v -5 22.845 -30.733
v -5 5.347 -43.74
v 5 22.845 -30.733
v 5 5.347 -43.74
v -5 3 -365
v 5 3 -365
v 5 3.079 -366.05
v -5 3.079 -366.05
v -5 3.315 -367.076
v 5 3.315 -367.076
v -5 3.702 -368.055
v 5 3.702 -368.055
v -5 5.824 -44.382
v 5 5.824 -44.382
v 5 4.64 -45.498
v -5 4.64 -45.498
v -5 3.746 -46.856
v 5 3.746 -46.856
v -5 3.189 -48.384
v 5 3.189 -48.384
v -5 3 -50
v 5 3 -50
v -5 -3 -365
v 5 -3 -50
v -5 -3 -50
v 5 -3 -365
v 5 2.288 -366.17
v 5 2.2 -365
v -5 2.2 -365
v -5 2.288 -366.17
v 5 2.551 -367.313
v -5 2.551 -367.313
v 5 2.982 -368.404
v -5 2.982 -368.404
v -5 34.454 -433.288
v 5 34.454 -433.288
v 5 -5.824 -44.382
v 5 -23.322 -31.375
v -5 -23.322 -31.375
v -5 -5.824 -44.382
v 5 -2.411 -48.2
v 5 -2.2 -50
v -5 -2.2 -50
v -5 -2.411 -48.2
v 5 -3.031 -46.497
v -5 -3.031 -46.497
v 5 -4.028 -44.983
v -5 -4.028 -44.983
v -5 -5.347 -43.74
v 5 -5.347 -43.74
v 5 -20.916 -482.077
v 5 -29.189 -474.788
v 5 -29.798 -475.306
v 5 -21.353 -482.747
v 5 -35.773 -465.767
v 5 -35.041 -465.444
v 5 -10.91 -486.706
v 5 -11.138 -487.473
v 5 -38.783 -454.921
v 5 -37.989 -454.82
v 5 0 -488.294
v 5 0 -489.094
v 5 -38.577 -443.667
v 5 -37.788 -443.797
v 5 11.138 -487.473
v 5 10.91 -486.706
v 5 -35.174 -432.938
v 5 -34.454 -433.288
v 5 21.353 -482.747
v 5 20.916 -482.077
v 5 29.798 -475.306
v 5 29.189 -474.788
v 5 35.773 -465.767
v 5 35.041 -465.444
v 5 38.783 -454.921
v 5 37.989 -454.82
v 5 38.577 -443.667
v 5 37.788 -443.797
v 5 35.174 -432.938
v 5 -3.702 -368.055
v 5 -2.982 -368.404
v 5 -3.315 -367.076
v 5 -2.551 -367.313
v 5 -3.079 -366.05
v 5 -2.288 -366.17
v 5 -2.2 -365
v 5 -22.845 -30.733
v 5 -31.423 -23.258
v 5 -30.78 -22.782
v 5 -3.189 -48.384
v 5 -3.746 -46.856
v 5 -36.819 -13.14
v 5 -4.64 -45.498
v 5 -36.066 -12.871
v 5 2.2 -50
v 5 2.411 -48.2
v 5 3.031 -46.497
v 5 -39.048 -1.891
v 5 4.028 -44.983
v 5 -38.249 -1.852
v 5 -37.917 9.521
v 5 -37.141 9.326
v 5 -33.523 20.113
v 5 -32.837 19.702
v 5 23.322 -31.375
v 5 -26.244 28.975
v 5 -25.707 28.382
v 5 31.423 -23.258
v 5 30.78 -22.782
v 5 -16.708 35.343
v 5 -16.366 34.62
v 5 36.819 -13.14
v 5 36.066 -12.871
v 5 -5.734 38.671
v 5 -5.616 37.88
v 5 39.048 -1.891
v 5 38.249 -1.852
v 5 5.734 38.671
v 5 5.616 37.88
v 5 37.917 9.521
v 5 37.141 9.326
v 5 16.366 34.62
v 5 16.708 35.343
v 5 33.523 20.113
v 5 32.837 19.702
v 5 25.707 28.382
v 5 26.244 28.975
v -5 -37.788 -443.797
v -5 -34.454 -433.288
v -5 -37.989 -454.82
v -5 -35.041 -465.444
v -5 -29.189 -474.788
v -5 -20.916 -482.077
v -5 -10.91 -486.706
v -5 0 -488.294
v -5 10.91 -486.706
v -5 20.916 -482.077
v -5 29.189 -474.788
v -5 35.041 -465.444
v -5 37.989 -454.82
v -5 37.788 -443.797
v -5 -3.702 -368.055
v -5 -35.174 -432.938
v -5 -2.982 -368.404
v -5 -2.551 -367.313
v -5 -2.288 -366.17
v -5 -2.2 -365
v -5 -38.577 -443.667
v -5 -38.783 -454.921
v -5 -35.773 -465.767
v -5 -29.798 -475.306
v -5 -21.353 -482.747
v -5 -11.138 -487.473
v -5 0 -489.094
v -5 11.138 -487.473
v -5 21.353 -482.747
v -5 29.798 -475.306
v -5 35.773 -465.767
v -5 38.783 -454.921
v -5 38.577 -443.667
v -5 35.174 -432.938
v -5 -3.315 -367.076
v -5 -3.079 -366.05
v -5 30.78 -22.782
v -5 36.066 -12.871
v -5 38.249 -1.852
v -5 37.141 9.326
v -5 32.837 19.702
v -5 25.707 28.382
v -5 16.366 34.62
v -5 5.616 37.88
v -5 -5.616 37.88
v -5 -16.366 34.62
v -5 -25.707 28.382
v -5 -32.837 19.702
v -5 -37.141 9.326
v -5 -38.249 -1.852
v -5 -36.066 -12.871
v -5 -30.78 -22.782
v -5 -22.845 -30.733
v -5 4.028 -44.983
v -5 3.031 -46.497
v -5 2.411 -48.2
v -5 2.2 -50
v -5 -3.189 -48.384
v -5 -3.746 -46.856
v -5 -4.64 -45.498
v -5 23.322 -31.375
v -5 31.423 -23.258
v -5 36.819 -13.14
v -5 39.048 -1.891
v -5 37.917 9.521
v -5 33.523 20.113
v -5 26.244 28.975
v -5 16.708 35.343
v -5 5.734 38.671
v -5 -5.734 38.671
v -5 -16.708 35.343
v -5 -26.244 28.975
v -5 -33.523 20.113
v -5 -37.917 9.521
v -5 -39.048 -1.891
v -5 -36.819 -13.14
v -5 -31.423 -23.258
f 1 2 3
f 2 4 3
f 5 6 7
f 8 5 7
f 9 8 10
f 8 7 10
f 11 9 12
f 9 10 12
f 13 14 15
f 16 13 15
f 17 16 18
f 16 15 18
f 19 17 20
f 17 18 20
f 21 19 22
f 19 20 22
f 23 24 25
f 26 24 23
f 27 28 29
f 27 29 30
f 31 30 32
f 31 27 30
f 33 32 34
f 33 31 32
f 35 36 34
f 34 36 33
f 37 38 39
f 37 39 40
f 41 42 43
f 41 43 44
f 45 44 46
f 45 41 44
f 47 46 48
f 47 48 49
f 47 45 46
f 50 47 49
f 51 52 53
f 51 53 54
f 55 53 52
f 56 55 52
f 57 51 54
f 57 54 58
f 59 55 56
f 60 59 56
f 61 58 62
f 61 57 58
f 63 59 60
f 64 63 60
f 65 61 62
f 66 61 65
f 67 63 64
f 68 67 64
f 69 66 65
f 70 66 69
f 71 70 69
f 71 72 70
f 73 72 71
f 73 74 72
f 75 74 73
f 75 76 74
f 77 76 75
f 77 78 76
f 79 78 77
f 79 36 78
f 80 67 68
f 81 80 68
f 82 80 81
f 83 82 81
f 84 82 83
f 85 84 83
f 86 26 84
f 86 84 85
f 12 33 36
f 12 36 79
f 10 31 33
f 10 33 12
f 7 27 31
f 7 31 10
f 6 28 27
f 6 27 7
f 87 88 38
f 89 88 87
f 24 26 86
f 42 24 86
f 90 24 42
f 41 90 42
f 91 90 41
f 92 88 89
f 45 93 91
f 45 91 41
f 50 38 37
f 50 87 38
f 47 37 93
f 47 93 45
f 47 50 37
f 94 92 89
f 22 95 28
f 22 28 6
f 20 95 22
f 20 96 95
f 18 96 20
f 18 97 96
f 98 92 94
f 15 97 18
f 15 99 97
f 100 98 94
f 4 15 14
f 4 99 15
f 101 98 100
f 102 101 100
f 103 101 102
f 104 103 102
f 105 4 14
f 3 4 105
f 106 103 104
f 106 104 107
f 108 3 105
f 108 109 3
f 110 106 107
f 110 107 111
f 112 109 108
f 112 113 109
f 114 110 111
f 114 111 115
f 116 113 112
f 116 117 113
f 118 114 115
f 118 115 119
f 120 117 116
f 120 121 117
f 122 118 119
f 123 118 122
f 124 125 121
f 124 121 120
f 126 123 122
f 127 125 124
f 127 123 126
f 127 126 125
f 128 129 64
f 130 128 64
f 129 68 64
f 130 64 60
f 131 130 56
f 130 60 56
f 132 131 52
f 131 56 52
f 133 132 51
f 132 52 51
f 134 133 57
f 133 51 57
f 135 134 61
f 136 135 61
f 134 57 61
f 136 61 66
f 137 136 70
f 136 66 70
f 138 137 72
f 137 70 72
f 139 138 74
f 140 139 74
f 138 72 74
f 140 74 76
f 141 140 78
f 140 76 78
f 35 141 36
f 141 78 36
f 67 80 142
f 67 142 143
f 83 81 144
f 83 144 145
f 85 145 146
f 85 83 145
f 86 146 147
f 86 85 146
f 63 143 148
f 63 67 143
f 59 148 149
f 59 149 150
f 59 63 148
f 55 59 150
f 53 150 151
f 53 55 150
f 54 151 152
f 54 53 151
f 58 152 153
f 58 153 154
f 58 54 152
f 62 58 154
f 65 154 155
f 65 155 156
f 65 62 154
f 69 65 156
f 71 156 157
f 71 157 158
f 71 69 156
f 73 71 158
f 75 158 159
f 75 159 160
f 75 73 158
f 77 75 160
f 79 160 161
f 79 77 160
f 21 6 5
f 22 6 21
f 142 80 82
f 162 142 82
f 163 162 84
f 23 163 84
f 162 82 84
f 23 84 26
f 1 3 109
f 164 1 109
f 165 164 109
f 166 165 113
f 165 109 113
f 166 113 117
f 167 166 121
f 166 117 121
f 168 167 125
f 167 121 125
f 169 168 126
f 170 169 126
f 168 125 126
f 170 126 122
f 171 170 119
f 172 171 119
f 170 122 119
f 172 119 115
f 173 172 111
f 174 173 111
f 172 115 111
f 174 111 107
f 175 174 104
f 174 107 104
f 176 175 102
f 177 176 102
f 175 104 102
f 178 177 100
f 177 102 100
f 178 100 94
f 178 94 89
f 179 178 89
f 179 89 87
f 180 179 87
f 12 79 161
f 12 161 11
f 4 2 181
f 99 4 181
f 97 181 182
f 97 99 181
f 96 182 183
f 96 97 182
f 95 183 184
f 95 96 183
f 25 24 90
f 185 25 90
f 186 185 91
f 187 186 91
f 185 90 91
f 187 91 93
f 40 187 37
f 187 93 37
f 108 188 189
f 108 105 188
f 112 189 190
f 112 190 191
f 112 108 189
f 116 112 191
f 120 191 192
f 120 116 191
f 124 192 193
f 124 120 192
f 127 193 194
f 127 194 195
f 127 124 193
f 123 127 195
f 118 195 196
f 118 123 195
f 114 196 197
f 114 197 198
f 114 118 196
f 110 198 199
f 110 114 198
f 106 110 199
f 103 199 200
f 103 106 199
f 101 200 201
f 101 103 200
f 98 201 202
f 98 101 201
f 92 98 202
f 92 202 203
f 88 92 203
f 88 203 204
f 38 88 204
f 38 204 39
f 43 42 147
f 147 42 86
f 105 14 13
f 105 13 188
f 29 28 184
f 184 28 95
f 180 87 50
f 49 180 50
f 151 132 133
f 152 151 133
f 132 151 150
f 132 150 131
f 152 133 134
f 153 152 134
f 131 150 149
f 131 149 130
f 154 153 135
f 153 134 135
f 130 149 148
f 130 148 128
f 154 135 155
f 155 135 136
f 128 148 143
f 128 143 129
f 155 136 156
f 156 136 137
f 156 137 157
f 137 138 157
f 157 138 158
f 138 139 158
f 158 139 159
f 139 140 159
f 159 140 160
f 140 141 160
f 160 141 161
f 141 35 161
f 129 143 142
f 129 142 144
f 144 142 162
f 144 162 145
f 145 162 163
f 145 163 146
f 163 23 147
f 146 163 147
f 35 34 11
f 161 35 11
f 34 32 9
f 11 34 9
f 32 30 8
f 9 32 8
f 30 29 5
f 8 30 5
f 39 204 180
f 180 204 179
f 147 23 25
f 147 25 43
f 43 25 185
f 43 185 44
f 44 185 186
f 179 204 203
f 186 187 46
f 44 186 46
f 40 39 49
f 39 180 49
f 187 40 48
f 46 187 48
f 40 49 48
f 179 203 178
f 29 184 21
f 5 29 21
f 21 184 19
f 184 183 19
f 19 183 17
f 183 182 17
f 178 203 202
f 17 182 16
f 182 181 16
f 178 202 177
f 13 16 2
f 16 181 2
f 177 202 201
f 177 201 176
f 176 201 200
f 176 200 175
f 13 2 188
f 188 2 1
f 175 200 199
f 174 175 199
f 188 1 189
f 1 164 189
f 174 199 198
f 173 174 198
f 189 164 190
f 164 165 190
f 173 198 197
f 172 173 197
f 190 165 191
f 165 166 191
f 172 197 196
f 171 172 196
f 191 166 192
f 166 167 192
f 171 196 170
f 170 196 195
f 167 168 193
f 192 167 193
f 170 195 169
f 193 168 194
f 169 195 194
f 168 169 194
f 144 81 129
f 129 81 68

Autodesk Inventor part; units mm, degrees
ref_plane "YZ Plane" through (0, 0, 0) normal (1, 0, 0) x (0, 1, 0)
ref_plane "XZ Plane" through (0, 0, 0) normal (0, 1, 0) x (-1, 0, 0)
ref_plane "XY Plane" through (0, 0, 0) normal (0, 0, 1) x (1, 0, 0)
sketch "スケッチ1" plane through (0, 0, 0) normal (1, 0, 0) x (0, 1, 0)
  arc A0 (23.0723, -31.0387) -> (-23.0723, -31.0387) centre (0, 0) ccw
  arc A1 (-34.7971, -433.1214) -> (34.7971, -433.1214) centre (0, -450) ccw
  arc A2 (-2.581, -50) -> (-5.574, -44.0458) centre (-10, -50) ccw
  line L0 (-5.574, -44.0458) -> (-23.0723, -31.0387)
  line L1 (23.0723, -31.0387) -> (5.574, -44.0458)
  line L2 (34.7971, -433.1214) -> (3.3248, -368.2378)
  line L3 (-34.7971, -433.1214) -> (-3.3248, -368.2378)
  arc A3 (5.574, -44.0458) -> (2.581, -50) centre (10, -50) ccw
  arc A4 (2.581, -365) -> (3.3248, -368.2378) centre (10, -365) ccw
  arc A5 (-3.3248, -368.2378) -> (-2.581, -365) centre (-10, -365) ccw
  line L4 (-2.581, -50) -> (-2.581, -365)
  line L5 (2.581, -365) -> (2.581, -50)
  line L6 (5.824, -44.3821) -> (23.3222, -31.3749)
  arc A6 (23.3222, -31.3749) -> (-23.3222, -31.3749) centre (0, 0) ccw
  line L7 (-23.3222, -31.3749) -> (-5.824, -44.3821)
  arc A7 (-3, -50) -> (-5.824, -44.3821) centre (-10, -50) ccw
  line L8 (-3, -50) -> (-3, -365)
  arc A8 (-3.7018, -368.055) -> (-3, -365) centre (-10, -365) ccw
  line L9 (-3.7018, -368.055) -> (-35.1741, -432.9385)
  arc A9 (-35.1741, -432.9385) -> (35.1741, -432.9385) centre (0, -450) ccw
  line L10 (35.1741, -432.9385) -> (3.7018, -368.055)
  arc A10 (3, -365) -> (3.7018, -368.055) centre (10, -365) ccw
  line L11 (3, -365) -> (3, -50)
  arc A11 (5.824, -44.3821) -> (3, -50) centre (10, -50) ccw
  arc A12 (5.3467, -43.74) -> (2.2, -50) centre (10, -50) ccw
  line L12 (5.3467, -43.74) -> (22.845, -30.7329)
  arc A13 (22.845, -30.7329) -> (-22.845, -30.7329) centre (0, 0) ccw
  line L13 (-22.845, -30.7329) -> (-5.3467, -43.74)
  arc A14 (-2.2, -50) -> (-5.3467, -43.74) centre (-10, -50) ccw
  line L14 (-2.2, -50) -> (-2.2, -365)
  arc A15 (-2.982, -368.4041) -> (-2.2, -365) centre (-10, -365) ccw
  line L15 (-2.982, -368.4041) -> (-34.4543, -433.2876)
  arc A16 (-34.4543, -433.2876) -> (34.4543, -433.2876) centre (0, -450) ccw
  line L16 (34.4543, -433.2876) -> (2.982, -368.4041)
  arc A17 (2.2, -365) -> (2.982, -368.4041) centre (10, -365) ccw
  line L17 (2.2, -365) -> (2.2, -50)
  dimension "d0" = 77.3493
  dimension "d1" = 77.3493
  dimension "d2" = 450
  dimension "d39" = 0.419
  dimension "d40" = 0.8
  dimension "d41" = 7
  dimension "d42" = 7
  dimension "d43" = 7
  dimension "d44" = 7
  dimension "d45" = 10
  dimension "d46" = 10
  dimension "d47" = 85
  dimension "d48" = 50
extrude "押し出し1" add sketch "スケッチ1" along normal mid plane 10 contours L1 A3 L5 A4 L2 A1 L3 A5 L4 A2 L0 A0 | A11 L11 A10 L10 A9 L9 A8 L8 A7 L7 A6 L6
equation "\"d0\" = d1"
equation "\"d41\" = d43"
equation "\"d43\" = d44"
equation "\"d44\" = d42"
equation "\"d46\" = d45"
properties part number "scara-belt1" material "ゴム"
